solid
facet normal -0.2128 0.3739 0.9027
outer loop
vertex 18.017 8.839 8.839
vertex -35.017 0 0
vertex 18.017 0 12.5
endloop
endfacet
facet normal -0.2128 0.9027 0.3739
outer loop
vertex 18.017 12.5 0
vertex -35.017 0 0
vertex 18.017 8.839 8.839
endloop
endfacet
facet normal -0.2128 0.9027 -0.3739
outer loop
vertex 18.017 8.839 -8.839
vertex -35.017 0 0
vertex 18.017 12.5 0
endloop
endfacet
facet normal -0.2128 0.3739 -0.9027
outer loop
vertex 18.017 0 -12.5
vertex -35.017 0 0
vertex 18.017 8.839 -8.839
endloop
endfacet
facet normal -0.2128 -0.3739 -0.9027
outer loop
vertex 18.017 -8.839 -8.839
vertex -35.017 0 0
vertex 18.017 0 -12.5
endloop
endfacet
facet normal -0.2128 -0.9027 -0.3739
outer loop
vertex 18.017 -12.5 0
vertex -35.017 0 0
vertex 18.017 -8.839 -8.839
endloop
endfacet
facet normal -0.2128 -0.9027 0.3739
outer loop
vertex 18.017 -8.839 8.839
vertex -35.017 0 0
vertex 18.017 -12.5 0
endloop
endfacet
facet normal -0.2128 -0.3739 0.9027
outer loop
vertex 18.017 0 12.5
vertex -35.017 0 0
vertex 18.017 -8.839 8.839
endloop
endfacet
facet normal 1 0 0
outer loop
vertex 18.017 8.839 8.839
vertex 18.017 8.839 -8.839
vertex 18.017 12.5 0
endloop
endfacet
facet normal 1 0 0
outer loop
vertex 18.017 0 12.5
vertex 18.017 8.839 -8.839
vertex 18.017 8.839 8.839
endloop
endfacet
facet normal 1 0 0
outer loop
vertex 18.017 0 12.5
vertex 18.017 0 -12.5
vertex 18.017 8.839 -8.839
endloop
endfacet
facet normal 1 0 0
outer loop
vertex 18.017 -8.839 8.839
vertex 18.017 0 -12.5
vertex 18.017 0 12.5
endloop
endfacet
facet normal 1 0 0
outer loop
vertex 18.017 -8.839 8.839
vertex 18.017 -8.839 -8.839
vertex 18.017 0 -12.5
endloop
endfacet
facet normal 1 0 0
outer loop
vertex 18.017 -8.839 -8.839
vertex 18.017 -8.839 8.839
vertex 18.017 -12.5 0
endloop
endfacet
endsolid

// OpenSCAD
$fn = 8;

module pointer()
{
	scale(v = [0.5, 0.5, 1.5])
		cylinder(h = sqrt(2) * 5, r1 = 5, r2 = 0, center = true);
}

scale(v = [5, 5, 5])
	translate(v = [-1.7, 0, 0])
		rotate(a = -90, v = [0, 1, 0]) 
			pointer();
